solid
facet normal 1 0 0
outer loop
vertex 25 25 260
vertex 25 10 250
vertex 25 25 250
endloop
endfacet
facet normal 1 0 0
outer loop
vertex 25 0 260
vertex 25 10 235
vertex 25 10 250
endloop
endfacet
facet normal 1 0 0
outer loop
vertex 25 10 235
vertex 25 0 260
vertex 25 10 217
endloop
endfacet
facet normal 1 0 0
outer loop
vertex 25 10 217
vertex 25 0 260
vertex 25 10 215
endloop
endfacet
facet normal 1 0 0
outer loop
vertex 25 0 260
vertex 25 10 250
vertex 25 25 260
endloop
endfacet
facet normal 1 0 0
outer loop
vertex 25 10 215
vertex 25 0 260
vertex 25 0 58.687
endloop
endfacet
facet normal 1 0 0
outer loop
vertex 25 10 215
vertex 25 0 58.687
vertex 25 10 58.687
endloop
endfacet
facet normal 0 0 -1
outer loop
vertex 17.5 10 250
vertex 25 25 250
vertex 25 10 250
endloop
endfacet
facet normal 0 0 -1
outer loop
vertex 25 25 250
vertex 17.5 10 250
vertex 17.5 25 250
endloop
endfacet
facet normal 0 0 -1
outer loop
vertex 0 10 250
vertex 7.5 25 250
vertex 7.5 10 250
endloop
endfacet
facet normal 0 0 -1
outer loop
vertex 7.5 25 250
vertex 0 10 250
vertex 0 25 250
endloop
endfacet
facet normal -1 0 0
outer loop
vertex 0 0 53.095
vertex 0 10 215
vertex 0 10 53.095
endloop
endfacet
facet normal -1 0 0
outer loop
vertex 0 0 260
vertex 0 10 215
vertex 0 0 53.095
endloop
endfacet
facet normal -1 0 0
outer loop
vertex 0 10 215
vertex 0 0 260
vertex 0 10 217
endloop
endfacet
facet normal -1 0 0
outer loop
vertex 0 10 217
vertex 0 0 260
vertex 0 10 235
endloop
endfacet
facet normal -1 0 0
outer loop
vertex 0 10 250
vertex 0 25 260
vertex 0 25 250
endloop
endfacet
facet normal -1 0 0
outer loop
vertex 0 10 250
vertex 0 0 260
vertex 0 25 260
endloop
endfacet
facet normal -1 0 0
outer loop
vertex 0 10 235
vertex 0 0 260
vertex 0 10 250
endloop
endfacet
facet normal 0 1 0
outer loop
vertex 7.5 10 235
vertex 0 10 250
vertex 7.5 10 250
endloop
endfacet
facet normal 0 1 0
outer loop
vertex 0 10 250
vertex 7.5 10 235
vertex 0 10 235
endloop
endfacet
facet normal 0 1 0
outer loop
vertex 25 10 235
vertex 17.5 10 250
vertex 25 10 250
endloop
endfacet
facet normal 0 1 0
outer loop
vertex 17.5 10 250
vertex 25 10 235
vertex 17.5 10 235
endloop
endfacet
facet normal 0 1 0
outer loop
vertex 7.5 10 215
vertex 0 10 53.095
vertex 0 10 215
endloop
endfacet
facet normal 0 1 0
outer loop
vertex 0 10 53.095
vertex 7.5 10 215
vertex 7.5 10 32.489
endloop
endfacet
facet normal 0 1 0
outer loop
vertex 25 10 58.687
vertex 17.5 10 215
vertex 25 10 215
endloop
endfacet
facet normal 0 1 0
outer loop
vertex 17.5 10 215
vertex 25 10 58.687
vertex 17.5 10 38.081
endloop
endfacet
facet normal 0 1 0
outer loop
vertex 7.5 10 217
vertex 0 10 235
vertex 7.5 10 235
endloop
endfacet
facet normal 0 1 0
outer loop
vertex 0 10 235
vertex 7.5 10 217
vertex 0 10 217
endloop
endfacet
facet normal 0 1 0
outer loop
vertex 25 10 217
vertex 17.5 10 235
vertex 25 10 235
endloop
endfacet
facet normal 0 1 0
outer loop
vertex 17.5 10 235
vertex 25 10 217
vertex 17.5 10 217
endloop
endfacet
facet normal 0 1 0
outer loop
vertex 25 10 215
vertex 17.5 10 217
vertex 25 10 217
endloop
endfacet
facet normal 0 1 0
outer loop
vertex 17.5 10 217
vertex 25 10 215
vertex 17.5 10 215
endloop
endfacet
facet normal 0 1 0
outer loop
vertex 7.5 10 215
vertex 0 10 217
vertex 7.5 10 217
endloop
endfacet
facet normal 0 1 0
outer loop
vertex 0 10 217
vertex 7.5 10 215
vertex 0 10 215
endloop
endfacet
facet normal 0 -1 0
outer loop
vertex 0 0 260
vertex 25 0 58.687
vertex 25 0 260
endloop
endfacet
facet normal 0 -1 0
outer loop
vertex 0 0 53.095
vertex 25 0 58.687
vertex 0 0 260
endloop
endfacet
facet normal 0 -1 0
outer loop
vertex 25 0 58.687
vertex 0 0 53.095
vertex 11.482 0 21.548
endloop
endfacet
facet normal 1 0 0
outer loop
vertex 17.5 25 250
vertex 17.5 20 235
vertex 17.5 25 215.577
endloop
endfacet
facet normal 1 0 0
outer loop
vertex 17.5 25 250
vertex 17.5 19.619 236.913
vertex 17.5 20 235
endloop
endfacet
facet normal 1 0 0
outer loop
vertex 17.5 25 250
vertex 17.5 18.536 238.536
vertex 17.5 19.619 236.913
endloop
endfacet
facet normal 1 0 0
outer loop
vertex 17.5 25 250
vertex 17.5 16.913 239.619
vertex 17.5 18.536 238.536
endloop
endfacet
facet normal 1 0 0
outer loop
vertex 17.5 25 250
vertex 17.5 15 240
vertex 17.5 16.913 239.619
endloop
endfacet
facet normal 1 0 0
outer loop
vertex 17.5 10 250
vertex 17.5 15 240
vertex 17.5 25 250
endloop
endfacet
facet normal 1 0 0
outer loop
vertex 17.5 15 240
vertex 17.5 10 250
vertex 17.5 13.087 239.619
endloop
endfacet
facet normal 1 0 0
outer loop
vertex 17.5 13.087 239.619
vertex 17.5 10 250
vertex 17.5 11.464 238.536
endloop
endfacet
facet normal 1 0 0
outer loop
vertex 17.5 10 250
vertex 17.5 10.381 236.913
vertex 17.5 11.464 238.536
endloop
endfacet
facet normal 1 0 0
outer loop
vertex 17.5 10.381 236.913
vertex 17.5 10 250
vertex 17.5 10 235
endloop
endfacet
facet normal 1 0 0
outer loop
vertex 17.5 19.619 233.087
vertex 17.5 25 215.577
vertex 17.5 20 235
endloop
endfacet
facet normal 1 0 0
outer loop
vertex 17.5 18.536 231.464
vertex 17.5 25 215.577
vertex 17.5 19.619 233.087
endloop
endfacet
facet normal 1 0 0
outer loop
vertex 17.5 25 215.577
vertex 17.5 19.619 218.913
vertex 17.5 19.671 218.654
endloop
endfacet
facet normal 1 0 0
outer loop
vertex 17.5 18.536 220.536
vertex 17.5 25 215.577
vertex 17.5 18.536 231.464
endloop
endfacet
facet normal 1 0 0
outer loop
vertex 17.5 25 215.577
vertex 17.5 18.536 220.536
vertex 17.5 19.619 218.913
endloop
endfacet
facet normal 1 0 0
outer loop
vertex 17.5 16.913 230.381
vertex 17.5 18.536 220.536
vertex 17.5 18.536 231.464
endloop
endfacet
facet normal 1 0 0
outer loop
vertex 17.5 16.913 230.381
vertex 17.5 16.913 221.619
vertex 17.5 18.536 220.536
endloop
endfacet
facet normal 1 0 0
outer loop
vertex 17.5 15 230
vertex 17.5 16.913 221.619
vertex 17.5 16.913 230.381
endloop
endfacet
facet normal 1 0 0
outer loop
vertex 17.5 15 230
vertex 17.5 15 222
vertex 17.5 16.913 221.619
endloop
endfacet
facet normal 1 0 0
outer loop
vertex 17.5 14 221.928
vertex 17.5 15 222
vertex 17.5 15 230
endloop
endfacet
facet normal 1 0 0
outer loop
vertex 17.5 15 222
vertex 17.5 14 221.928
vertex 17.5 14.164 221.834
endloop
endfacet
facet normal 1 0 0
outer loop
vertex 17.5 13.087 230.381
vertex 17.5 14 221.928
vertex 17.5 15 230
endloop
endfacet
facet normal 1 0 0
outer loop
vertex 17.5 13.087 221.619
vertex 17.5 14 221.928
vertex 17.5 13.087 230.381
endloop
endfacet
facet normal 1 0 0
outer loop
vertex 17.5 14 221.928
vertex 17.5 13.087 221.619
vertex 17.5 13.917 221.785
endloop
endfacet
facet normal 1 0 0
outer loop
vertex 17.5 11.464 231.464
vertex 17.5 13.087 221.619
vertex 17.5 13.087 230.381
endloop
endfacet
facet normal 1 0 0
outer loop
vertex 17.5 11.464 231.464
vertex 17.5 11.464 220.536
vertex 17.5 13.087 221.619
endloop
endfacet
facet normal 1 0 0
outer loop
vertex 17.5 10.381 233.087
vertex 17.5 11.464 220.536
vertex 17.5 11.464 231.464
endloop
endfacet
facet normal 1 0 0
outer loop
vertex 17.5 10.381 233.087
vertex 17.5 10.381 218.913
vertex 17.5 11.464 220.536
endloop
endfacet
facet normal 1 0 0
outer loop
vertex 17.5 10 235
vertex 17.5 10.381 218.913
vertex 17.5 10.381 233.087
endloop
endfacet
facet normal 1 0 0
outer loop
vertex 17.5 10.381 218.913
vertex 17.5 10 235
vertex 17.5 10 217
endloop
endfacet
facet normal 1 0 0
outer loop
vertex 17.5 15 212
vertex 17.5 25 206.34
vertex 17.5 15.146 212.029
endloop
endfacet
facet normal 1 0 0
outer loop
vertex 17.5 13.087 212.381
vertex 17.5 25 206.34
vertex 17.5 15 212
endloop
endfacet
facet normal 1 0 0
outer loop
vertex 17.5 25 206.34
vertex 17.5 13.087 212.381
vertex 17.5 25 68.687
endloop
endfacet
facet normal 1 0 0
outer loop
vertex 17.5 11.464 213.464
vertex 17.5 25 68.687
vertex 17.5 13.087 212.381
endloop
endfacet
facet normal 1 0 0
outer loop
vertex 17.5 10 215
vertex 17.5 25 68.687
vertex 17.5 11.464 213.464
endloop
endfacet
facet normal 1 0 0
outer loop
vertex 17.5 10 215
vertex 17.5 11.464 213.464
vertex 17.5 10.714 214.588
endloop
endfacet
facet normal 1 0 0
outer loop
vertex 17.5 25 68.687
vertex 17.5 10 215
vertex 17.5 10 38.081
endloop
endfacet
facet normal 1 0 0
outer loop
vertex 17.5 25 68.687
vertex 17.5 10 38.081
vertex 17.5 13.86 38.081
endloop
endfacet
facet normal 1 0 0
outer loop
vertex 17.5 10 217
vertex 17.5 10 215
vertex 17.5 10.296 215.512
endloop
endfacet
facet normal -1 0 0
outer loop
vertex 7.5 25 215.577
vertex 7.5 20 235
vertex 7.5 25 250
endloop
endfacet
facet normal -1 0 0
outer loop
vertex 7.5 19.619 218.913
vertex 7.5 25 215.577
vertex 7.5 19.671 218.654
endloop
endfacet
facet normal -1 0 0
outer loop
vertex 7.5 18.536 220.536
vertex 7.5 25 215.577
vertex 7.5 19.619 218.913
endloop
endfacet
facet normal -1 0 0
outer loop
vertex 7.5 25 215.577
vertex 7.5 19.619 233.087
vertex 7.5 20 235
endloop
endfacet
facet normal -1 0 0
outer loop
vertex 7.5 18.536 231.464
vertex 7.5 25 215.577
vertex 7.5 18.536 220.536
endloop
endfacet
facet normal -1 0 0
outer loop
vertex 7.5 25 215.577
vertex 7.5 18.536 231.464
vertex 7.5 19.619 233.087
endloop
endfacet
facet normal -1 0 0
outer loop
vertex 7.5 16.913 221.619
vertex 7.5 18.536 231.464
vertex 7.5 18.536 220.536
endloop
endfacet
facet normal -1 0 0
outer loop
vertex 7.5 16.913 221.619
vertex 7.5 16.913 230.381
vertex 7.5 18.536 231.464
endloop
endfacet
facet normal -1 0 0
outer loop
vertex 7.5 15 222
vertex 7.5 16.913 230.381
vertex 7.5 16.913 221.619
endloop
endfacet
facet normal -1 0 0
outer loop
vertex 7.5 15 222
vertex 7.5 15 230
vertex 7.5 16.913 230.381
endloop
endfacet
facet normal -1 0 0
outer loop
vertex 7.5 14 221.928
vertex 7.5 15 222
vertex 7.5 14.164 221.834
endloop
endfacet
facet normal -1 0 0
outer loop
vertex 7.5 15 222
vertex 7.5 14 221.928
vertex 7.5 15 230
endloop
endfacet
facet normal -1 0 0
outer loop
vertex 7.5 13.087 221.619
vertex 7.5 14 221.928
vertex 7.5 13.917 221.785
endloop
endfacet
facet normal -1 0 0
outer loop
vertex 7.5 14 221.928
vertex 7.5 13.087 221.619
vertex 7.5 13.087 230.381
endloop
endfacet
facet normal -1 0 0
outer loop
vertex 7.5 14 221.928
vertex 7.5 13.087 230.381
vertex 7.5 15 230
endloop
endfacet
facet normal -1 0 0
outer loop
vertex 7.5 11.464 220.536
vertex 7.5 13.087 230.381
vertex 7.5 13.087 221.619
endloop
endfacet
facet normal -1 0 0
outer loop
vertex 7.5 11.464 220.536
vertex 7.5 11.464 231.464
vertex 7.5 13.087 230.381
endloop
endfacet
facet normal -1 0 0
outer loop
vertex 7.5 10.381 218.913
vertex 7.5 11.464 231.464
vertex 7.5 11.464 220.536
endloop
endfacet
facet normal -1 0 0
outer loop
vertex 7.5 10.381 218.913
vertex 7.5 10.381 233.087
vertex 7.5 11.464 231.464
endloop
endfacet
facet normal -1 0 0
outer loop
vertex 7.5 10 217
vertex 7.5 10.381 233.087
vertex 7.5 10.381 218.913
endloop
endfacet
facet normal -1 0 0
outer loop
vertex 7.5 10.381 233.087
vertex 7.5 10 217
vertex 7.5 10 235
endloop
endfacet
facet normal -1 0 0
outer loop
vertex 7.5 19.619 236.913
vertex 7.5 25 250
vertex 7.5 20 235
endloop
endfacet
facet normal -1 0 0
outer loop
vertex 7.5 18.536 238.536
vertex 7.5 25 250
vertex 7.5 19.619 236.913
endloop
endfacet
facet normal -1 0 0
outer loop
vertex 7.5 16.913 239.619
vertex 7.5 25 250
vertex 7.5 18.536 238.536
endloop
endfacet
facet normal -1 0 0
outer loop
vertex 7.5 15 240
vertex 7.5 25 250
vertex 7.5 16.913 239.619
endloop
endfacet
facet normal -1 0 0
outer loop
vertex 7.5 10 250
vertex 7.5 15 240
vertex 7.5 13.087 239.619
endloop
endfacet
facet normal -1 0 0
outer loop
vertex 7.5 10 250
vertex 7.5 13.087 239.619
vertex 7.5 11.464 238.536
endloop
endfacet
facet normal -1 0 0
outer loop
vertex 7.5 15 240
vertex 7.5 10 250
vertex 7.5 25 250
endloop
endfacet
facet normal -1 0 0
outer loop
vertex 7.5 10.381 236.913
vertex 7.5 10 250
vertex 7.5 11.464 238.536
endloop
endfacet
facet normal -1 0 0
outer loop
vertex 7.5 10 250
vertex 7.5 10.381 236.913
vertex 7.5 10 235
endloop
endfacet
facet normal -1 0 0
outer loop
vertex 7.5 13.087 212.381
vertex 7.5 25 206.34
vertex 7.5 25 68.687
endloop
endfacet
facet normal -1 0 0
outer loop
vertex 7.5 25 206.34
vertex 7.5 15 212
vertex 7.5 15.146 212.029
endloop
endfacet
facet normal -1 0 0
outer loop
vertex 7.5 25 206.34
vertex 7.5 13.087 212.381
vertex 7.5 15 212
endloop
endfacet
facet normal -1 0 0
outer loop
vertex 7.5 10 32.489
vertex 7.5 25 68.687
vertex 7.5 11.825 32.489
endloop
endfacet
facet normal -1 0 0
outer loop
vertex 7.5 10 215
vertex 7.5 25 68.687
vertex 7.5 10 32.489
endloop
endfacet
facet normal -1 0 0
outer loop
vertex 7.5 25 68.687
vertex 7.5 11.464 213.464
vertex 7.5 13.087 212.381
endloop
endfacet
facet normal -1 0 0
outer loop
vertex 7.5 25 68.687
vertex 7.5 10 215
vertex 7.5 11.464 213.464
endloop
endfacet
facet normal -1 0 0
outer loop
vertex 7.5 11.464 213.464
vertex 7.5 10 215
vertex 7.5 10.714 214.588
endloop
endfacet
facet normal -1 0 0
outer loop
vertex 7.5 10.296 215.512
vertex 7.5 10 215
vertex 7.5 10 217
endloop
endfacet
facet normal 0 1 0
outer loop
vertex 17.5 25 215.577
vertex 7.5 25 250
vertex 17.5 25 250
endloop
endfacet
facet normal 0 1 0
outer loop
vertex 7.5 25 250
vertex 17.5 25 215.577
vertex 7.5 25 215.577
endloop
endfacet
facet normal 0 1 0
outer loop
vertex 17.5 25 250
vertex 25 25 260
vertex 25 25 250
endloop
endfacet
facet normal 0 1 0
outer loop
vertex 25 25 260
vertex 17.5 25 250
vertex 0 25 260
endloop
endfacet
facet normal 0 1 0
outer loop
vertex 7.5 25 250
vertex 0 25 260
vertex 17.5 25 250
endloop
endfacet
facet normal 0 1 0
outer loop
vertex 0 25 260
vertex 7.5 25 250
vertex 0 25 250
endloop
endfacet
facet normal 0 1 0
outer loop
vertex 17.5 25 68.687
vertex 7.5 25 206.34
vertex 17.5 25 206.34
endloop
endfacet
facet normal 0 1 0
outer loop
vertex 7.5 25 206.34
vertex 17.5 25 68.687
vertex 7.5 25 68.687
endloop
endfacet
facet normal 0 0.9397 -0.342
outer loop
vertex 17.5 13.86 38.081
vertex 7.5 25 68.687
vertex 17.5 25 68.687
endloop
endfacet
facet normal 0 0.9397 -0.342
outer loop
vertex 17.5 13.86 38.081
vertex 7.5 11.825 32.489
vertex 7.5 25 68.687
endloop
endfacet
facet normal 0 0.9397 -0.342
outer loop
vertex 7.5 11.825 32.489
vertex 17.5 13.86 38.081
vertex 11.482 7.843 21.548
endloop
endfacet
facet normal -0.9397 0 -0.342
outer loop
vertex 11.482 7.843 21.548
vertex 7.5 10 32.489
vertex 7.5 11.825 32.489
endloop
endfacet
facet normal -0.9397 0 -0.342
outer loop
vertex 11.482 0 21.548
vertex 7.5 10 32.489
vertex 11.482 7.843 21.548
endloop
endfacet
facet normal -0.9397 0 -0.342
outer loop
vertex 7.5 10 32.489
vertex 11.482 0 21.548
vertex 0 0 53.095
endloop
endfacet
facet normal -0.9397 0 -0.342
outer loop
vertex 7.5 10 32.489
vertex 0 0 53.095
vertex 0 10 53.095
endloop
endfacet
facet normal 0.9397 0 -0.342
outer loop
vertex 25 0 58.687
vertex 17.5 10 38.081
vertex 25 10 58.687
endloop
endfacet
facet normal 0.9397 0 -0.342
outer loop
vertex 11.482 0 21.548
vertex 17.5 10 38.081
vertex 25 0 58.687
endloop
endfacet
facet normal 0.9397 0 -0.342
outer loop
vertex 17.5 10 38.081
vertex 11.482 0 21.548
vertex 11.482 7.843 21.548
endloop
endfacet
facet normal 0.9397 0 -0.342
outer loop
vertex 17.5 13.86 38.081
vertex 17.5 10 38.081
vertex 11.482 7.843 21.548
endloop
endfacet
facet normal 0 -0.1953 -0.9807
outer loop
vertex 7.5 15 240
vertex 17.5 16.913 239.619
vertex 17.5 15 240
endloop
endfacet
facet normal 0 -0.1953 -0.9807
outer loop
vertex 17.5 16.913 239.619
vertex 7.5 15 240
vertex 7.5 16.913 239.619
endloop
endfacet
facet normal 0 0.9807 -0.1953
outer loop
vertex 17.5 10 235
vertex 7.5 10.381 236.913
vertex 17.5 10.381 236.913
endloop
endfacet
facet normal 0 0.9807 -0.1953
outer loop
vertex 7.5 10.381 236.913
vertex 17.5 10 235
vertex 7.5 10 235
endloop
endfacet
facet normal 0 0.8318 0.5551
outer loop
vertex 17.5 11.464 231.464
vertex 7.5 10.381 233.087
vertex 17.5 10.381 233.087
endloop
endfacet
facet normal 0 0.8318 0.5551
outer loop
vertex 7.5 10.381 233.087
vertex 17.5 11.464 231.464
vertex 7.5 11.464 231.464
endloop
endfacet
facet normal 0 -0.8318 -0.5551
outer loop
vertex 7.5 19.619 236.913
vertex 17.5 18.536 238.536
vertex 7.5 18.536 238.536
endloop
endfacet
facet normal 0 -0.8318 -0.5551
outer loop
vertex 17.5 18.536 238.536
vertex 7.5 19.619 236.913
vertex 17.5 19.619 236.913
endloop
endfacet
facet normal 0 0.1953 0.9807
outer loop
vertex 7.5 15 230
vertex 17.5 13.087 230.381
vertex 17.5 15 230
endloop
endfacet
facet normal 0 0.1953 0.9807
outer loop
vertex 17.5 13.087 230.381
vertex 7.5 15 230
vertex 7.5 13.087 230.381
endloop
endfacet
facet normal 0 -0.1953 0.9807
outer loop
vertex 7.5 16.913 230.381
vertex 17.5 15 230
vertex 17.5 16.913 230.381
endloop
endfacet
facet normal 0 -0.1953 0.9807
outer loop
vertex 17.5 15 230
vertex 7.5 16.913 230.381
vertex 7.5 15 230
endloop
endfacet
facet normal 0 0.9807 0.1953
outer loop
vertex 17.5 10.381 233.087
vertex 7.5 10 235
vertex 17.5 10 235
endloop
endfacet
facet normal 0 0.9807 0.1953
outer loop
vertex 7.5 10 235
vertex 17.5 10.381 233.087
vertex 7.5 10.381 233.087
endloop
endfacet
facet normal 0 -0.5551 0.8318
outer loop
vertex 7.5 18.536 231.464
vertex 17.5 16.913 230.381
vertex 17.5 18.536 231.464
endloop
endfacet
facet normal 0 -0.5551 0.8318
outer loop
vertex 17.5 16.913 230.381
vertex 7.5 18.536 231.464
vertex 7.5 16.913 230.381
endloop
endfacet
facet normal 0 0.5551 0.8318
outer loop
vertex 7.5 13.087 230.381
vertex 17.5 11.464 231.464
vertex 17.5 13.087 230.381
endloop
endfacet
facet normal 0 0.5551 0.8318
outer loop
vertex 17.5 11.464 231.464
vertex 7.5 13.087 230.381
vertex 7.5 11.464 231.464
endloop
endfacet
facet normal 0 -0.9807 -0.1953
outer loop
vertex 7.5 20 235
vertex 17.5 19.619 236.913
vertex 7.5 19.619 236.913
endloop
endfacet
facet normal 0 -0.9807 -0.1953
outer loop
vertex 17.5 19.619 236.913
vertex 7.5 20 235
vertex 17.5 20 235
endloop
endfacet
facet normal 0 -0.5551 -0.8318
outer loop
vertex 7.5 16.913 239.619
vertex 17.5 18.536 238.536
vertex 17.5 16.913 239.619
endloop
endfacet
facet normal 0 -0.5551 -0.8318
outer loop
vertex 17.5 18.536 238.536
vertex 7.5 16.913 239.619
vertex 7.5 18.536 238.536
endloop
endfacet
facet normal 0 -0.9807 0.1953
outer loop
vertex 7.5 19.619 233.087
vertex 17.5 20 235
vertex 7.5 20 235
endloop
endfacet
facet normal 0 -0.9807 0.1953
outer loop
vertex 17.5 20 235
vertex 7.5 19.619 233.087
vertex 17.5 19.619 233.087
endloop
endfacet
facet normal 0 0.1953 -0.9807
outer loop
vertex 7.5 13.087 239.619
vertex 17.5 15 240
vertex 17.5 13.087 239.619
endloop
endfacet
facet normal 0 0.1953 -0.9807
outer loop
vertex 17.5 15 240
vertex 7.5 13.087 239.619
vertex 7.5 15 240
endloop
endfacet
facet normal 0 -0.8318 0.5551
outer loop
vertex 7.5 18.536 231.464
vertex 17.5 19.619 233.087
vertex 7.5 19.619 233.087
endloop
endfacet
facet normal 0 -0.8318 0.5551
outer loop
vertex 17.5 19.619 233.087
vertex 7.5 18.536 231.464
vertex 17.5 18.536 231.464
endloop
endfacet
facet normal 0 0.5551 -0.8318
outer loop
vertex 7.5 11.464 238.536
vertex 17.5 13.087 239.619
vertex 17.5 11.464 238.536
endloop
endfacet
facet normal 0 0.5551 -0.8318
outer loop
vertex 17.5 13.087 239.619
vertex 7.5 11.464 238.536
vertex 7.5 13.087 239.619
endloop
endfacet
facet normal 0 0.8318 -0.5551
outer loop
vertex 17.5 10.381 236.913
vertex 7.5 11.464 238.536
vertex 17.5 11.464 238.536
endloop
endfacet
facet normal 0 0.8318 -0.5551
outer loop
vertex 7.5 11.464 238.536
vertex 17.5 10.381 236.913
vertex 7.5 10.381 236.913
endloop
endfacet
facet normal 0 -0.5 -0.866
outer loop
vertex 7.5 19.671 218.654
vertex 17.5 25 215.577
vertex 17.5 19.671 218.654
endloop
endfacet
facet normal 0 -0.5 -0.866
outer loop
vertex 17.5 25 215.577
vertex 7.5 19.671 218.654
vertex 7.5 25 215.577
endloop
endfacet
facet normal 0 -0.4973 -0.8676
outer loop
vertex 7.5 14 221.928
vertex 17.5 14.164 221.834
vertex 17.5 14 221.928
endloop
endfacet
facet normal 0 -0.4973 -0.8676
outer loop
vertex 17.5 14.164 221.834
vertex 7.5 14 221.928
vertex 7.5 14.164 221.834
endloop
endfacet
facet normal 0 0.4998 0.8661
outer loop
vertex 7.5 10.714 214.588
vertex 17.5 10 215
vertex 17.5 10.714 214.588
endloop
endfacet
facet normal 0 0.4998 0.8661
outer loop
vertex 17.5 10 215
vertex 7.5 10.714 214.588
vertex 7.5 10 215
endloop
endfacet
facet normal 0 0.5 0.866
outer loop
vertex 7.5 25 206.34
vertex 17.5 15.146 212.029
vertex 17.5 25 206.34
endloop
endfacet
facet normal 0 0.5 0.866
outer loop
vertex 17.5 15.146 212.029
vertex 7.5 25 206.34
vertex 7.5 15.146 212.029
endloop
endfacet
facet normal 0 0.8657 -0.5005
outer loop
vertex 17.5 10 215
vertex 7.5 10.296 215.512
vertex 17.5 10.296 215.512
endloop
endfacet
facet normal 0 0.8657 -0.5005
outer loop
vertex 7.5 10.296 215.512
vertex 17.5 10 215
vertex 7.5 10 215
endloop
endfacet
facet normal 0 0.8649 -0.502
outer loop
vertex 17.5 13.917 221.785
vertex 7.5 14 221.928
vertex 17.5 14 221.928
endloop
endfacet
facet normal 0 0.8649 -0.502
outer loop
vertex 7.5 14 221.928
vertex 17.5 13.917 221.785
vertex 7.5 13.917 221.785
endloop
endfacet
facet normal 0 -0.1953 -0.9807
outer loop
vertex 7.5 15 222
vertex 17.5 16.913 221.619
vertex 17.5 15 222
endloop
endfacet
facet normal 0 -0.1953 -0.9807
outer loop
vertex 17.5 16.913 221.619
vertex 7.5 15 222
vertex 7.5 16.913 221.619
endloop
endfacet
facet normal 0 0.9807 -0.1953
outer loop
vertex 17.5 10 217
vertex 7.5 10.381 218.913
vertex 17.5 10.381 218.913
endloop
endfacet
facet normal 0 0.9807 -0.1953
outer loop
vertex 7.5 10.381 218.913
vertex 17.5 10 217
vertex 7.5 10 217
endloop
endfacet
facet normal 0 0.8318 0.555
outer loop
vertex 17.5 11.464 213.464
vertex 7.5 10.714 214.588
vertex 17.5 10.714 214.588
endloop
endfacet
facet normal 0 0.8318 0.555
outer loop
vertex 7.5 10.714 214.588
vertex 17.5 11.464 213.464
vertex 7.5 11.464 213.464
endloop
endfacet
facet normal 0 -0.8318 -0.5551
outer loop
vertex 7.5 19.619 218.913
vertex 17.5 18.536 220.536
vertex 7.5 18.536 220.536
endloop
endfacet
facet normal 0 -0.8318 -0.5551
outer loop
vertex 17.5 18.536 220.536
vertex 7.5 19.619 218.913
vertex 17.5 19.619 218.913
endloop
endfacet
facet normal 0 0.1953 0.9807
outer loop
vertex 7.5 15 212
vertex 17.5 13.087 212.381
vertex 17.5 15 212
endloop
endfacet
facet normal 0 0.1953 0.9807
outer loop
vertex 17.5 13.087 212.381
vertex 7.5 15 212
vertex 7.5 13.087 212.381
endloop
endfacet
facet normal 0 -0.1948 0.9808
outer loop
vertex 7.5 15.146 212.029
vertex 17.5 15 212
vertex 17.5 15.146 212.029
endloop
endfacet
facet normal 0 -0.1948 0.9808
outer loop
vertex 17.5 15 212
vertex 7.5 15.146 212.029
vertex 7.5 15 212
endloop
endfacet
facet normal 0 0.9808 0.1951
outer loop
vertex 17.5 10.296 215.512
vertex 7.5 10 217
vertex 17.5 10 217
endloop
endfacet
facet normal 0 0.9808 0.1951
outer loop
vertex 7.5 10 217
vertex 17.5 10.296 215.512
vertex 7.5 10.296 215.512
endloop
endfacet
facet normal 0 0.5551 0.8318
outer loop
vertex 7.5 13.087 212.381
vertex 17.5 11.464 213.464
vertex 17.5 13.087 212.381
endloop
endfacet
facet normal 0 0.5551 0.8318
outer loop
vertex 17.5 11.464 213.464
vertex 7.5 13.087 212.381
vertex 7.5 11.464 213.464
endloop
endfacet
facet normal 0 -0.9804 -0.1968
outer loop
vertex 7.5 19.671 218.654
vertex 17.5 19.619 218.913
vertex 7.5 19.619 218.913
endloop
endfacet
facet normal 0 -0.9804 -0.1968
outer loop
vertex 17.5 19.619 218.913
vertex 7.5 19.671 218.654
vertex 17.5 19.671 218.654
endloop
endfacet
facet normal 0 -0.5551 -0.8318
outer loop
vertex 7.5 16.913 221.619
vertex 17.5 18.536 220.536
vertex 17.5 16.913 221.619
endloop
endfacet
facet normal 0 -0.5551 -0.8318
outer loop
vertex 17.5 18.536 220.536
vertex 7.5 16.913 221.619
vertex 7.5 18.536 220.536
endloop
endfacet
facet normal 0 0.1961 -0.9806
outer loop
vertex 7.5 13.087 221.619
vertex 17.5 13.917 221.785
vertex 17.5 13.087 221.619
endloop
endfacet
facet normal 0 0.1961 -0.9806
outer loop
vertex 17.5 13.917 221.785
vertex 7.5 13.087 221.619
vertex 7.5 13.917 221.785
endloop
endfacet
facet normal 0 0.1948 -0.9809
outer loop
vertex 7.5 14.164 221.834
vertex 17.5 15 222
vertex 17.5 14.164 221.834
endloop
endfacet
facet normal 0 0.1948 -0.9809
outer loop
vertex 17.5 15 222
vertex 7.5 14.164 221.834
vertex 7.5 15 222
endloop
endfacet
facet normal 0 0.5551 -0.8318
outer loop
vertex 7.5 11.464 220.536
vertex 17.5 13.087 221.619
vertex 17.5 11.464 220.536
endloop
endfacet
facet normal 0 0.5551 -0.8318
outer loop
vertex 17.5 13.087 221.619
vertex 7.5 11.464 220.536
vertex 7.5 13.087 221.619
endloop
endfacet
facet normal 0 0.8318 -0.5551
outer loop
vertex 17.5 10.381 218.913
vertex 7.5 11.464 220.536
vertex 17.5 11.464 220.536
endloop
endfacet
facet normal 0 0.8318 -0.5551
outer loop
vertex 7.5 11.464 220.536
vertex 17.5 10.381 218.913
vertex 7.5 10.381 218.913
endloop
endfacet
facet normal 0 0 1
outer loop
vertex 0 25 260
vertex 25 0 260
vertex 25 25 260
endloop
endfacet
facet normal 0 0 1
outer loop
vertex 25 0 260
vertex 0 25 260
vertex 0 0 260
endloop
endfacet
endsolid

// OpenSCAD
//Customizable Tent Spike
// This is a simple open-source parametric tent spike


//CUSTOMIZER VARIABLES

//Defines the depth of spike in mm
d=250;// [60:300]

//CUSTOMIZER VARIABLES END

//Defines the width of spike base in mm
w=25; 

//Defines the height of spike base  in mm
h= 10; 

//Defines the width of spike spine in mm
p=10; 

//Defines the height of spike spine in mm
s=25; 

//Defines the hole radius in mm
r=5; 


module spike() 
{
difference(){
difference(){
difference(){
difference(){
difference(){
difference(){
union(){
cube([w,h,d]); // spike base
translate([w/2-p/2,0,0]) cube([p,s, d]); //spike spine
}
rotate([-20,0,0]) cube([w,50,150]); //blade front
}
translate ([0,0,-20])rotate([0,-20,0]) cube ([w,w,100]);//blade right
}
translate ([0,0,-10])rotate([0,20,0]) cube ([w,w,100]);//blade left
}
translate([0,s-h,d-15])rotate([0,90,0])cylinder (h=w,r=r); // hole
}
translate([0,p,d-35])rotate([-30,0,0]) cube([w,2*p,p-2]); //square cut
}
translate([0,s-h,d-33])rotate([0,90,0])cylinder (h=w,r=r); // bottom of square cut
}
translate([0,0,d]) cube([s,s,h]); // hammer pad
}

spike();

